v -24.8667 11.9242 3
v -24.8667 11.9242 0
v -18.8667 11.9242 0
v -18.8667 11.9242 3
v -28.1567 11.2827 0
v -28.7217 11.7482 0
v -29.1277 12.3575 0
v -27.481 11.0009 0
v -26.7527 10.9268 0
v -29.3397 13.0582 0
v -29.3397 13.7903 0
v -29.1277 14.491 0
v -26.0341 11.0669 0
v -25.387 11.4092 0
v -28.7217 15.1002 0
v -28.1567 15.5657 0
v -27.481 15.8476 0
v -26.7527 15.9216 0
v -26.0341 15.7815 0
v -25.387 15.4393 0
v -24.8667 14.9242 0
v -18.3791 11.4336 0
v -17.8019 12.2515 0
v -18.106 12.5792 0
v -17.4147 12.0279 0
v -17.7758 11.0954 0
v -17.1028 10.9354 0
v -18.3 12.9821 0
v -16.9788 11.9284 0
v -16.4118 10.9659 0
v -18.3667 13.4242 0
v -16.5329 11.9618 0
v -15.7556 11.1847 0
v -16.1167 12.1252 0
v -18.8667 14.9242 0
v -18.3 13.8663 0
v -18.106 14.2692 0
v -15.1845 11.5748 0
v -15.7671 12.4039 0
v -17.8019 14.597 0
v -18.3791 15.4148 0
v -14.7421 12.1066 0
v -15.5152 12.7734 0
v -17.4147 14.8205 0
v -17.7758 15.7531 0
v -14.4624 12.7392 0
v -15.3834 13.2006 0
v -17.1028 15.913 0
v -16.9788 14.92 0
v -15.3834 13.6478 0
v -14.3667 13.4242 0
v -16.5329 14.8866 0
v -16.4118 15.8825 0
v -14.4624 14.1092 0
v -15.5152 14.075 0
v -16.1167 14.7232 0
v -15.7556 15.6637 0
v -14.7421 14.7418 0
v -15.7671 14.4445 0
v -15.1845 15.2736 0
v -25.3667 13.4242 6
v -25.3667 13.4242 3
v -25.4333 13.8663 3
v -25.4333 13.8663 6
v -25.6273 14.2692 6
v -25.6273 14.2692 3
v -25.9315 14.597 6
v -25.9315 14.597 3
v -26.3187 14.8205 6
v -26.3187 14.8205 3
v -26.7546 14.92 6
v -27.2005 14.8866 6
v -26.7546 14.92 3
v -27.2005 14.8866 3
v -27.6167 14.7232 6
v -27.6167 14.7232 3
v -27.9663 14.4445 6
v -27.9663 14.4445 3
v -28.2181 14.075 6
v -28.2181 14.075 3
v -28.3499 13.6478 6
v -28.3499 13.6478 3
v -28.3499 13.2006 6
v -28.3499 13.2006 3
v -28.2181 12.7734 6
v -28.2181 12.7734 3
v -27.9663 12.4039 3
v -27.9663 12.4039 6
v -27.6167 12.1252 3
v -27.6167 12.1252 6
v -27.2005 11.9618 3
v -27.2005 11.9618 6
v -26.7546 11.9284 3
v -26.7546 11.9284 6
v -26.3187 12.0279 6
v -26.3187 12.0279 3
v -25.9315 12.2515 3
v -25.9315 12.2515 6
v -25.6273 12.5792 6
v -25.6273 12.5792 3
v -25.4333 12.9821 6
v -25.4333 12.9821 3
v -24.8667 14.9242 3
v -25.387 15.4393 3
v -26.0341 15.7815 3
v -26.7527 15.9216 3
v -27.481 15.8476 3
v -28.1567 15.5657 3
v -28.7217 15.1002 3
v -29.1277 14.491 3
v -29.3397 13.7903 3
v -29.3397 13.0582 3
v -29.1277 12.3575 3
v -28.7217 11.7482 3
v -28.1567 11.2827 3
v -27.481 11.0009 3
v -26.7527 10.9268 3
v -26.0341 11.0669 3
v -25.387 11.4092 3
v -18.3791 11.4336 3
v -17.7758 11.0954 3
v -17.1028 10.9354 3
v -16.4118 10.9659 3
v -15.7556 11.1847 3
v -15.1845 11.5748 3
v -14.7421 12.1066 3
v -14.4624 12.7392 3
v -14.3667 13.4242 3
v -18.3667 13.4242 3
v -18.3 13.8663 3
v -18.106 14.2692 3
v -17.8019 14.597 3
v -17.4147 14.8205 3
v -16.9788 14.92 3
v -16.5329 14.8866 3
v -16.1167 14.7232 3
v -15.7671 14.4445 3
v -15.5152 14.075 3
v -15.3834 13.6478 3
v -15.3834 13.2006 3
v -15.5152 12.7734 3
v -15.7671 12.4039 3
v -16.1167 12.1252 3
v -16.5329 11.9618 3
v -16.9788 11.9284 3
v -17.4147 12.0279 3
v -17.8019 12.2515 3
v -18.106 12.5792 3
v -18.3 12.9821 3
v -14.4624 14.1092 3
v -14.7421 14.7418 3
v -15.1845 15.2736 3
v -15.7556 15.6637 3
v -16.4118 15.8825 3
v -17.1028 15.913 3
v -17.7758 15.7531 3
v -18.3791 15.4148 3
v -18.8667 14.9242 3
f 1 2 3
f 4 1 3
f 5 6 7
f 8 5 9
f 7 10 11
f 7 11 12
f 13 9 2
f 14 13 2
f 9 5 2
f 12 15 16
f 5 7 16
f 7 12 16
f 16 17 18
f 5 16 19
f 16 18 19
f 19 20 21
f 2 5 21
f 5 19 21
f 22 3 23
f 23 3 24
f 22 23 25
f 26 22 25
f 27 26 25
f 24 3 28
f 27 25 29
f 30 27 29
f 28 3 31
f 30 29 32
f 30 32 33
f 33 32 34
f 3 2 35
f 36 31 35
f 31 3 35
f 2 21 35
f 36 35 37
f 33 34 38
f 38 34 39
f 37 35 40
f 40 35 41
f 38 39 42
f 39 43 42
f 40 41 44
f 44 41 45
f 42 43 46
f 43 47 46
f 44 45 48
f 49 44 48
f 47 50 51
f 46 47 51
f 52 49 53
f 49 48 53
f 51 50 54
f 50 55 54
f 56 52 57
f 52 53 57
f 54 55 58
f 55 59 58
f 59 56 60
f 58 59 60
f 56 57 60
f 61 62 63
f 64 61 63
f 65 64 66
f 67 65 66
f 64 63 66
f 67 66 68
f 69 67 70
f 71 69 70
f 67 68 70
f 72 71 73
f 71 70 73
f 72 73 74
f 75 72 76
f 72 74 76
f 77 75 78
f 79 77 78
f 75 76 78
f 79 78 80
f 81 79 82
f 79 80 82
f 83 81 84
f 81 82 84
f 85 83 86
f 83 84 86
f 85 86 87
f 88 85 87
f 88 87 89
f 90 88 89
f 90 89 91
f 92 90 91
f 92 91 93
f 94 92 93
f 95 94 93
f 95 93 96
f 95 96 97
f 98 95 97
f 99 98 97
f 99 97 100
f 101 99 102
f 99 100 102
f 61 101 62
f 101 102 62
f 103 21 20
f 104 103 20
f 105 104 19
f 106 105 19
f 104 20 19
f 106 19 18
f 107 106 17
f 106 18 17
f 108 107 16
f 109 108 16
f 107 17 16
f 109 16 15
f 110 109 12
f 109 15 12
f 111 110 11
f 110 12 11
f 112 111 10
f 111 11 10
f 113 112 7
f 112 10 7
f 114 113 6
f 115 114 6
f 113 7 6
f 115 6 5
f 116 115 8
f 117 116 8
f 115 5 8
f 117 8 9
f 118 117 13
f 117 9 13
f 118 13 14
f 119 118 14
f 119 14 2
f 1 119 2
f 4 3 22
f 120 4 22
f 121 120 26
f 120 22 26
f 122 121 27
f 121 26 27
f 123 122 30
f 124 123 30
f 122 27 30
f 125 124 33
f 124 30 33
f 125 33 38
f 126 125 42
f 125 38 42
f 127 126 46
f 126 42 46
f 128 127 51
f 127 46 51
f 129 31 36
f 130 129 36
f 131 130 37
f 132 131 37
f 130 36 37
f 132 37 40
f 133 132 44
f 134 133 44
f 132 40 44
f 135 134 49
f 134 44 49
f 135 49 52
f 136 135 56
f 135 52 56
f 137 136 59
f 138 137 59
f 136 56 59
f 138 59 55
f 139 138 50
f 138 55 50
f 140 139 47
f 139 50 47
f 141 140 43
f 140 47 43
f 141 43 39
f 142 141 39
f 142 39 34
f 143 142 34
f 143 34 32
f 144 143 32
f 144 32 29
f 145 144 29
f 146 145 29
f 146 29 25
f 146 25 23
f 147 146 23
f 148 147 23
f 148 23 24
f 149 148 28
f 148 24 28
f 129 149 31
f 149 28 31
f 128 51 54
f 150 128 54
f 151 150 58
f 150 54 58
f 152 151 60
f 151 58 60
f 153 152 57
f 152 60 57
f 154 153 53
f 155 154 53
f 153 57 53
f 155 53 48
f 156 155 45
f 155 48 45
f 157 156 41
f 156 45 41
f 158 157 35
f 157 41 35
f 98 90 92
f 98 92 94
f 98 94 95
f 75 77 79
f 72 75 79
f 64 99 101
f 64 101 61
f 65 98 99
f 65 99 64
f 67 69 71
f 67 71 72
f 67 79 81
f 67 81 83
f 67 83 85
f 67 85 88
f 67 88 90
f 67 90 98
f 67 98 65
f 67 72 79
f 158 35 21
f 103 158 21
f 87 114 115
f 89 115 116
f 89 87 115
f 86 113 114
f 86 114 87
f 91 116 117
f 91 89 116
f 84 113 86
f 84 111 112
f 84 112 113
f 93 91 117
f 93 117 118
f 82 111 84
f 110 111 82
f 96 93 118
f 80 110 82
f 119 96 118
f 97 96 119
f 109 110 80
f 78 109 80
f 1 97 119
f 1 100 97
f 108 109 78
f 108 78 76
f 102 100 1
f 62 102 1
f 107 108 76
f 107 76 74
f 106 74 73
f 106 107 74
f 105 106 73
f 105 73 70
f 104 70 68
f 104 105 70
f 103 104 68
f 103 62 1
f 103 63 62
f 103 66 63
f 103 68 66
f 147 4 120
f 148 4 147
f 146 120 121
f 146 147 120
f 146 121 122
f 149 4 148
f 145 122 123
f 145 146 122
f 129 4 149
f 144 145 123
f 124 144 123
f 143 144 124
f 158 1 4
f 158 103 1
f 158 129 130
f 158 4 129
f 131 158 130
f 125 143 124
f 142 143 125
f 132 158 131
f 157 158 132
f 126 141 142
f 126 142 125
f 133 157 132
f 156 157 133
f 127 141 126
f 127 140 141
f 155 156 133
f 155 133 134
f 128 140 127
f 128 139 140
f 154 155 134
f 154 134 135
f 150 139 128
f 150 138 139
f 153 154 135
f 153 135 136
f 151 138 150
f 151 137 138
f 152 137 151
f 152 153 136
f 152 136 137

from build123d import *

# Parameters (mm, degrees)
BOSS_EXTRUDE1_DEPTH = 3
SKETCH3_R           = 1.5
BOSS_EXTRUDE2_DEPTH = 3
SKETCH4_R           = 1.5
CUT_EXTRUDE1_DEPTH  = 3


with BuildPart() as part:
    # Sketch2 → Boss-Extrude1 (new body)
    with BuildSketch(Plane.XY):
        with BuildLine():
            Line((-25.866686, 11.924208702), (-25.866686, 14.924208702))
            Line((-25.866686, 14.924208702), (-24.866686, 14.924208702))
            ThreePointArc((-24.866686, 14.924208702), (-29.366686, 13.424208702), (-24.866686, 11.924208702))
            Line((-24.866686, 11.924208702), (-25.866686, 11.924208702))
        make_face()
        with BuildLine():
            Line((-24.866686, 14.924208702), (-25.866686, 14.924208702))
            Line((-25.866686, 14.924208702), (-25.866686, 11.924208702))
            Line((-25.866686, 11.924208702), (-24.866686, 11.924208702))
            ThreePointArc((-24.866686, 11.924208702), (-24.494977755, 12.633639287), (-24.366686, 13.424208702))
            ThreePointArc((-24.366686, 13.424208702), (-24.494977755, 14.214778117), (-24.866686, 14.924208702))
        make_face()
        with BuildLine():
            Line((-18.866686, 14.924208702), (-24.866686, 14.924208702))
            ThreePointArc((-24.866686, 14.924208702), (-24.494977755, 14.214778117), (-24.366686, 13.424208702))
            ThreePointArc((-24.366686, 13.424208702), (-24.494977755, 12.633639287), (-24.866686, 11.924208702))
            Line((-24.866686, 11.924208702), (-18.866686, 11.924208702))
            ThreePointArc((-18.866686, 11.924208702), (-19.366686, 13.424208702), (-18.866686, 14.924208702))
        make_face()
        with BuildLine():
            ThreePointArc((-14.366686, 13.424208702), (-16.076116585, 15.795916947), (-18.866686, 14.924208702))
            Line((-18.866686, 14.924208702), (-17.866686, 14.924208702))
            Line((-17.866686, 14.924208702), (-17.866686, 11.924208702))
            Line((-17.866686, 11.924208702), (-18.866686, 11.924208702))
            ThreePointArc((-18.866686, 11.924208702), (-16.076116585, 11.052500457), (-14.366686, 13.424208702))
        make_face()
        with BuildLine():
            Line((-17.866686, 14.924208702), (-18.866686, 14.924208702))
            ThreePointArc((-18.866686, 14.924208702), (-19.366686, 13.424208702), (-18.866686, 11.924208702))
            Line((-18.866686, 11.924208702), (-17.866686, 11.924208702))
            Line((-17.866686, 11.924208702), (-17.866686, 14.924208702))
        make_face()
    extrude(amount=BOSS_EXTRUDE1_DEPTH)

    # Sketch3 → Boss-Extrude2 (add)
    with BuildSketch(Plane.XY.offset(3)):
        with Locations((-26.866686, 13.424208702)):
            Circle(SKETCH3_R)
    extrude(amount=BOSS_EXTRUDE2_DEPTH)

    # Sketch4 → Cut-Extrude1 (cut)
    with BuildSketch(Plane(origin=(0, 0, 0), x_dir=(-1, 0, 0), z_dir=(0, 0, -1))):
        with Locations((16.866686, 13.424208702)):
            Circle(SKETCH4_R)
    extrude(amount=-CUT_EXTRUDE1_DEPTH, mode=Mode.SUBTRACT)


solid = part.part
